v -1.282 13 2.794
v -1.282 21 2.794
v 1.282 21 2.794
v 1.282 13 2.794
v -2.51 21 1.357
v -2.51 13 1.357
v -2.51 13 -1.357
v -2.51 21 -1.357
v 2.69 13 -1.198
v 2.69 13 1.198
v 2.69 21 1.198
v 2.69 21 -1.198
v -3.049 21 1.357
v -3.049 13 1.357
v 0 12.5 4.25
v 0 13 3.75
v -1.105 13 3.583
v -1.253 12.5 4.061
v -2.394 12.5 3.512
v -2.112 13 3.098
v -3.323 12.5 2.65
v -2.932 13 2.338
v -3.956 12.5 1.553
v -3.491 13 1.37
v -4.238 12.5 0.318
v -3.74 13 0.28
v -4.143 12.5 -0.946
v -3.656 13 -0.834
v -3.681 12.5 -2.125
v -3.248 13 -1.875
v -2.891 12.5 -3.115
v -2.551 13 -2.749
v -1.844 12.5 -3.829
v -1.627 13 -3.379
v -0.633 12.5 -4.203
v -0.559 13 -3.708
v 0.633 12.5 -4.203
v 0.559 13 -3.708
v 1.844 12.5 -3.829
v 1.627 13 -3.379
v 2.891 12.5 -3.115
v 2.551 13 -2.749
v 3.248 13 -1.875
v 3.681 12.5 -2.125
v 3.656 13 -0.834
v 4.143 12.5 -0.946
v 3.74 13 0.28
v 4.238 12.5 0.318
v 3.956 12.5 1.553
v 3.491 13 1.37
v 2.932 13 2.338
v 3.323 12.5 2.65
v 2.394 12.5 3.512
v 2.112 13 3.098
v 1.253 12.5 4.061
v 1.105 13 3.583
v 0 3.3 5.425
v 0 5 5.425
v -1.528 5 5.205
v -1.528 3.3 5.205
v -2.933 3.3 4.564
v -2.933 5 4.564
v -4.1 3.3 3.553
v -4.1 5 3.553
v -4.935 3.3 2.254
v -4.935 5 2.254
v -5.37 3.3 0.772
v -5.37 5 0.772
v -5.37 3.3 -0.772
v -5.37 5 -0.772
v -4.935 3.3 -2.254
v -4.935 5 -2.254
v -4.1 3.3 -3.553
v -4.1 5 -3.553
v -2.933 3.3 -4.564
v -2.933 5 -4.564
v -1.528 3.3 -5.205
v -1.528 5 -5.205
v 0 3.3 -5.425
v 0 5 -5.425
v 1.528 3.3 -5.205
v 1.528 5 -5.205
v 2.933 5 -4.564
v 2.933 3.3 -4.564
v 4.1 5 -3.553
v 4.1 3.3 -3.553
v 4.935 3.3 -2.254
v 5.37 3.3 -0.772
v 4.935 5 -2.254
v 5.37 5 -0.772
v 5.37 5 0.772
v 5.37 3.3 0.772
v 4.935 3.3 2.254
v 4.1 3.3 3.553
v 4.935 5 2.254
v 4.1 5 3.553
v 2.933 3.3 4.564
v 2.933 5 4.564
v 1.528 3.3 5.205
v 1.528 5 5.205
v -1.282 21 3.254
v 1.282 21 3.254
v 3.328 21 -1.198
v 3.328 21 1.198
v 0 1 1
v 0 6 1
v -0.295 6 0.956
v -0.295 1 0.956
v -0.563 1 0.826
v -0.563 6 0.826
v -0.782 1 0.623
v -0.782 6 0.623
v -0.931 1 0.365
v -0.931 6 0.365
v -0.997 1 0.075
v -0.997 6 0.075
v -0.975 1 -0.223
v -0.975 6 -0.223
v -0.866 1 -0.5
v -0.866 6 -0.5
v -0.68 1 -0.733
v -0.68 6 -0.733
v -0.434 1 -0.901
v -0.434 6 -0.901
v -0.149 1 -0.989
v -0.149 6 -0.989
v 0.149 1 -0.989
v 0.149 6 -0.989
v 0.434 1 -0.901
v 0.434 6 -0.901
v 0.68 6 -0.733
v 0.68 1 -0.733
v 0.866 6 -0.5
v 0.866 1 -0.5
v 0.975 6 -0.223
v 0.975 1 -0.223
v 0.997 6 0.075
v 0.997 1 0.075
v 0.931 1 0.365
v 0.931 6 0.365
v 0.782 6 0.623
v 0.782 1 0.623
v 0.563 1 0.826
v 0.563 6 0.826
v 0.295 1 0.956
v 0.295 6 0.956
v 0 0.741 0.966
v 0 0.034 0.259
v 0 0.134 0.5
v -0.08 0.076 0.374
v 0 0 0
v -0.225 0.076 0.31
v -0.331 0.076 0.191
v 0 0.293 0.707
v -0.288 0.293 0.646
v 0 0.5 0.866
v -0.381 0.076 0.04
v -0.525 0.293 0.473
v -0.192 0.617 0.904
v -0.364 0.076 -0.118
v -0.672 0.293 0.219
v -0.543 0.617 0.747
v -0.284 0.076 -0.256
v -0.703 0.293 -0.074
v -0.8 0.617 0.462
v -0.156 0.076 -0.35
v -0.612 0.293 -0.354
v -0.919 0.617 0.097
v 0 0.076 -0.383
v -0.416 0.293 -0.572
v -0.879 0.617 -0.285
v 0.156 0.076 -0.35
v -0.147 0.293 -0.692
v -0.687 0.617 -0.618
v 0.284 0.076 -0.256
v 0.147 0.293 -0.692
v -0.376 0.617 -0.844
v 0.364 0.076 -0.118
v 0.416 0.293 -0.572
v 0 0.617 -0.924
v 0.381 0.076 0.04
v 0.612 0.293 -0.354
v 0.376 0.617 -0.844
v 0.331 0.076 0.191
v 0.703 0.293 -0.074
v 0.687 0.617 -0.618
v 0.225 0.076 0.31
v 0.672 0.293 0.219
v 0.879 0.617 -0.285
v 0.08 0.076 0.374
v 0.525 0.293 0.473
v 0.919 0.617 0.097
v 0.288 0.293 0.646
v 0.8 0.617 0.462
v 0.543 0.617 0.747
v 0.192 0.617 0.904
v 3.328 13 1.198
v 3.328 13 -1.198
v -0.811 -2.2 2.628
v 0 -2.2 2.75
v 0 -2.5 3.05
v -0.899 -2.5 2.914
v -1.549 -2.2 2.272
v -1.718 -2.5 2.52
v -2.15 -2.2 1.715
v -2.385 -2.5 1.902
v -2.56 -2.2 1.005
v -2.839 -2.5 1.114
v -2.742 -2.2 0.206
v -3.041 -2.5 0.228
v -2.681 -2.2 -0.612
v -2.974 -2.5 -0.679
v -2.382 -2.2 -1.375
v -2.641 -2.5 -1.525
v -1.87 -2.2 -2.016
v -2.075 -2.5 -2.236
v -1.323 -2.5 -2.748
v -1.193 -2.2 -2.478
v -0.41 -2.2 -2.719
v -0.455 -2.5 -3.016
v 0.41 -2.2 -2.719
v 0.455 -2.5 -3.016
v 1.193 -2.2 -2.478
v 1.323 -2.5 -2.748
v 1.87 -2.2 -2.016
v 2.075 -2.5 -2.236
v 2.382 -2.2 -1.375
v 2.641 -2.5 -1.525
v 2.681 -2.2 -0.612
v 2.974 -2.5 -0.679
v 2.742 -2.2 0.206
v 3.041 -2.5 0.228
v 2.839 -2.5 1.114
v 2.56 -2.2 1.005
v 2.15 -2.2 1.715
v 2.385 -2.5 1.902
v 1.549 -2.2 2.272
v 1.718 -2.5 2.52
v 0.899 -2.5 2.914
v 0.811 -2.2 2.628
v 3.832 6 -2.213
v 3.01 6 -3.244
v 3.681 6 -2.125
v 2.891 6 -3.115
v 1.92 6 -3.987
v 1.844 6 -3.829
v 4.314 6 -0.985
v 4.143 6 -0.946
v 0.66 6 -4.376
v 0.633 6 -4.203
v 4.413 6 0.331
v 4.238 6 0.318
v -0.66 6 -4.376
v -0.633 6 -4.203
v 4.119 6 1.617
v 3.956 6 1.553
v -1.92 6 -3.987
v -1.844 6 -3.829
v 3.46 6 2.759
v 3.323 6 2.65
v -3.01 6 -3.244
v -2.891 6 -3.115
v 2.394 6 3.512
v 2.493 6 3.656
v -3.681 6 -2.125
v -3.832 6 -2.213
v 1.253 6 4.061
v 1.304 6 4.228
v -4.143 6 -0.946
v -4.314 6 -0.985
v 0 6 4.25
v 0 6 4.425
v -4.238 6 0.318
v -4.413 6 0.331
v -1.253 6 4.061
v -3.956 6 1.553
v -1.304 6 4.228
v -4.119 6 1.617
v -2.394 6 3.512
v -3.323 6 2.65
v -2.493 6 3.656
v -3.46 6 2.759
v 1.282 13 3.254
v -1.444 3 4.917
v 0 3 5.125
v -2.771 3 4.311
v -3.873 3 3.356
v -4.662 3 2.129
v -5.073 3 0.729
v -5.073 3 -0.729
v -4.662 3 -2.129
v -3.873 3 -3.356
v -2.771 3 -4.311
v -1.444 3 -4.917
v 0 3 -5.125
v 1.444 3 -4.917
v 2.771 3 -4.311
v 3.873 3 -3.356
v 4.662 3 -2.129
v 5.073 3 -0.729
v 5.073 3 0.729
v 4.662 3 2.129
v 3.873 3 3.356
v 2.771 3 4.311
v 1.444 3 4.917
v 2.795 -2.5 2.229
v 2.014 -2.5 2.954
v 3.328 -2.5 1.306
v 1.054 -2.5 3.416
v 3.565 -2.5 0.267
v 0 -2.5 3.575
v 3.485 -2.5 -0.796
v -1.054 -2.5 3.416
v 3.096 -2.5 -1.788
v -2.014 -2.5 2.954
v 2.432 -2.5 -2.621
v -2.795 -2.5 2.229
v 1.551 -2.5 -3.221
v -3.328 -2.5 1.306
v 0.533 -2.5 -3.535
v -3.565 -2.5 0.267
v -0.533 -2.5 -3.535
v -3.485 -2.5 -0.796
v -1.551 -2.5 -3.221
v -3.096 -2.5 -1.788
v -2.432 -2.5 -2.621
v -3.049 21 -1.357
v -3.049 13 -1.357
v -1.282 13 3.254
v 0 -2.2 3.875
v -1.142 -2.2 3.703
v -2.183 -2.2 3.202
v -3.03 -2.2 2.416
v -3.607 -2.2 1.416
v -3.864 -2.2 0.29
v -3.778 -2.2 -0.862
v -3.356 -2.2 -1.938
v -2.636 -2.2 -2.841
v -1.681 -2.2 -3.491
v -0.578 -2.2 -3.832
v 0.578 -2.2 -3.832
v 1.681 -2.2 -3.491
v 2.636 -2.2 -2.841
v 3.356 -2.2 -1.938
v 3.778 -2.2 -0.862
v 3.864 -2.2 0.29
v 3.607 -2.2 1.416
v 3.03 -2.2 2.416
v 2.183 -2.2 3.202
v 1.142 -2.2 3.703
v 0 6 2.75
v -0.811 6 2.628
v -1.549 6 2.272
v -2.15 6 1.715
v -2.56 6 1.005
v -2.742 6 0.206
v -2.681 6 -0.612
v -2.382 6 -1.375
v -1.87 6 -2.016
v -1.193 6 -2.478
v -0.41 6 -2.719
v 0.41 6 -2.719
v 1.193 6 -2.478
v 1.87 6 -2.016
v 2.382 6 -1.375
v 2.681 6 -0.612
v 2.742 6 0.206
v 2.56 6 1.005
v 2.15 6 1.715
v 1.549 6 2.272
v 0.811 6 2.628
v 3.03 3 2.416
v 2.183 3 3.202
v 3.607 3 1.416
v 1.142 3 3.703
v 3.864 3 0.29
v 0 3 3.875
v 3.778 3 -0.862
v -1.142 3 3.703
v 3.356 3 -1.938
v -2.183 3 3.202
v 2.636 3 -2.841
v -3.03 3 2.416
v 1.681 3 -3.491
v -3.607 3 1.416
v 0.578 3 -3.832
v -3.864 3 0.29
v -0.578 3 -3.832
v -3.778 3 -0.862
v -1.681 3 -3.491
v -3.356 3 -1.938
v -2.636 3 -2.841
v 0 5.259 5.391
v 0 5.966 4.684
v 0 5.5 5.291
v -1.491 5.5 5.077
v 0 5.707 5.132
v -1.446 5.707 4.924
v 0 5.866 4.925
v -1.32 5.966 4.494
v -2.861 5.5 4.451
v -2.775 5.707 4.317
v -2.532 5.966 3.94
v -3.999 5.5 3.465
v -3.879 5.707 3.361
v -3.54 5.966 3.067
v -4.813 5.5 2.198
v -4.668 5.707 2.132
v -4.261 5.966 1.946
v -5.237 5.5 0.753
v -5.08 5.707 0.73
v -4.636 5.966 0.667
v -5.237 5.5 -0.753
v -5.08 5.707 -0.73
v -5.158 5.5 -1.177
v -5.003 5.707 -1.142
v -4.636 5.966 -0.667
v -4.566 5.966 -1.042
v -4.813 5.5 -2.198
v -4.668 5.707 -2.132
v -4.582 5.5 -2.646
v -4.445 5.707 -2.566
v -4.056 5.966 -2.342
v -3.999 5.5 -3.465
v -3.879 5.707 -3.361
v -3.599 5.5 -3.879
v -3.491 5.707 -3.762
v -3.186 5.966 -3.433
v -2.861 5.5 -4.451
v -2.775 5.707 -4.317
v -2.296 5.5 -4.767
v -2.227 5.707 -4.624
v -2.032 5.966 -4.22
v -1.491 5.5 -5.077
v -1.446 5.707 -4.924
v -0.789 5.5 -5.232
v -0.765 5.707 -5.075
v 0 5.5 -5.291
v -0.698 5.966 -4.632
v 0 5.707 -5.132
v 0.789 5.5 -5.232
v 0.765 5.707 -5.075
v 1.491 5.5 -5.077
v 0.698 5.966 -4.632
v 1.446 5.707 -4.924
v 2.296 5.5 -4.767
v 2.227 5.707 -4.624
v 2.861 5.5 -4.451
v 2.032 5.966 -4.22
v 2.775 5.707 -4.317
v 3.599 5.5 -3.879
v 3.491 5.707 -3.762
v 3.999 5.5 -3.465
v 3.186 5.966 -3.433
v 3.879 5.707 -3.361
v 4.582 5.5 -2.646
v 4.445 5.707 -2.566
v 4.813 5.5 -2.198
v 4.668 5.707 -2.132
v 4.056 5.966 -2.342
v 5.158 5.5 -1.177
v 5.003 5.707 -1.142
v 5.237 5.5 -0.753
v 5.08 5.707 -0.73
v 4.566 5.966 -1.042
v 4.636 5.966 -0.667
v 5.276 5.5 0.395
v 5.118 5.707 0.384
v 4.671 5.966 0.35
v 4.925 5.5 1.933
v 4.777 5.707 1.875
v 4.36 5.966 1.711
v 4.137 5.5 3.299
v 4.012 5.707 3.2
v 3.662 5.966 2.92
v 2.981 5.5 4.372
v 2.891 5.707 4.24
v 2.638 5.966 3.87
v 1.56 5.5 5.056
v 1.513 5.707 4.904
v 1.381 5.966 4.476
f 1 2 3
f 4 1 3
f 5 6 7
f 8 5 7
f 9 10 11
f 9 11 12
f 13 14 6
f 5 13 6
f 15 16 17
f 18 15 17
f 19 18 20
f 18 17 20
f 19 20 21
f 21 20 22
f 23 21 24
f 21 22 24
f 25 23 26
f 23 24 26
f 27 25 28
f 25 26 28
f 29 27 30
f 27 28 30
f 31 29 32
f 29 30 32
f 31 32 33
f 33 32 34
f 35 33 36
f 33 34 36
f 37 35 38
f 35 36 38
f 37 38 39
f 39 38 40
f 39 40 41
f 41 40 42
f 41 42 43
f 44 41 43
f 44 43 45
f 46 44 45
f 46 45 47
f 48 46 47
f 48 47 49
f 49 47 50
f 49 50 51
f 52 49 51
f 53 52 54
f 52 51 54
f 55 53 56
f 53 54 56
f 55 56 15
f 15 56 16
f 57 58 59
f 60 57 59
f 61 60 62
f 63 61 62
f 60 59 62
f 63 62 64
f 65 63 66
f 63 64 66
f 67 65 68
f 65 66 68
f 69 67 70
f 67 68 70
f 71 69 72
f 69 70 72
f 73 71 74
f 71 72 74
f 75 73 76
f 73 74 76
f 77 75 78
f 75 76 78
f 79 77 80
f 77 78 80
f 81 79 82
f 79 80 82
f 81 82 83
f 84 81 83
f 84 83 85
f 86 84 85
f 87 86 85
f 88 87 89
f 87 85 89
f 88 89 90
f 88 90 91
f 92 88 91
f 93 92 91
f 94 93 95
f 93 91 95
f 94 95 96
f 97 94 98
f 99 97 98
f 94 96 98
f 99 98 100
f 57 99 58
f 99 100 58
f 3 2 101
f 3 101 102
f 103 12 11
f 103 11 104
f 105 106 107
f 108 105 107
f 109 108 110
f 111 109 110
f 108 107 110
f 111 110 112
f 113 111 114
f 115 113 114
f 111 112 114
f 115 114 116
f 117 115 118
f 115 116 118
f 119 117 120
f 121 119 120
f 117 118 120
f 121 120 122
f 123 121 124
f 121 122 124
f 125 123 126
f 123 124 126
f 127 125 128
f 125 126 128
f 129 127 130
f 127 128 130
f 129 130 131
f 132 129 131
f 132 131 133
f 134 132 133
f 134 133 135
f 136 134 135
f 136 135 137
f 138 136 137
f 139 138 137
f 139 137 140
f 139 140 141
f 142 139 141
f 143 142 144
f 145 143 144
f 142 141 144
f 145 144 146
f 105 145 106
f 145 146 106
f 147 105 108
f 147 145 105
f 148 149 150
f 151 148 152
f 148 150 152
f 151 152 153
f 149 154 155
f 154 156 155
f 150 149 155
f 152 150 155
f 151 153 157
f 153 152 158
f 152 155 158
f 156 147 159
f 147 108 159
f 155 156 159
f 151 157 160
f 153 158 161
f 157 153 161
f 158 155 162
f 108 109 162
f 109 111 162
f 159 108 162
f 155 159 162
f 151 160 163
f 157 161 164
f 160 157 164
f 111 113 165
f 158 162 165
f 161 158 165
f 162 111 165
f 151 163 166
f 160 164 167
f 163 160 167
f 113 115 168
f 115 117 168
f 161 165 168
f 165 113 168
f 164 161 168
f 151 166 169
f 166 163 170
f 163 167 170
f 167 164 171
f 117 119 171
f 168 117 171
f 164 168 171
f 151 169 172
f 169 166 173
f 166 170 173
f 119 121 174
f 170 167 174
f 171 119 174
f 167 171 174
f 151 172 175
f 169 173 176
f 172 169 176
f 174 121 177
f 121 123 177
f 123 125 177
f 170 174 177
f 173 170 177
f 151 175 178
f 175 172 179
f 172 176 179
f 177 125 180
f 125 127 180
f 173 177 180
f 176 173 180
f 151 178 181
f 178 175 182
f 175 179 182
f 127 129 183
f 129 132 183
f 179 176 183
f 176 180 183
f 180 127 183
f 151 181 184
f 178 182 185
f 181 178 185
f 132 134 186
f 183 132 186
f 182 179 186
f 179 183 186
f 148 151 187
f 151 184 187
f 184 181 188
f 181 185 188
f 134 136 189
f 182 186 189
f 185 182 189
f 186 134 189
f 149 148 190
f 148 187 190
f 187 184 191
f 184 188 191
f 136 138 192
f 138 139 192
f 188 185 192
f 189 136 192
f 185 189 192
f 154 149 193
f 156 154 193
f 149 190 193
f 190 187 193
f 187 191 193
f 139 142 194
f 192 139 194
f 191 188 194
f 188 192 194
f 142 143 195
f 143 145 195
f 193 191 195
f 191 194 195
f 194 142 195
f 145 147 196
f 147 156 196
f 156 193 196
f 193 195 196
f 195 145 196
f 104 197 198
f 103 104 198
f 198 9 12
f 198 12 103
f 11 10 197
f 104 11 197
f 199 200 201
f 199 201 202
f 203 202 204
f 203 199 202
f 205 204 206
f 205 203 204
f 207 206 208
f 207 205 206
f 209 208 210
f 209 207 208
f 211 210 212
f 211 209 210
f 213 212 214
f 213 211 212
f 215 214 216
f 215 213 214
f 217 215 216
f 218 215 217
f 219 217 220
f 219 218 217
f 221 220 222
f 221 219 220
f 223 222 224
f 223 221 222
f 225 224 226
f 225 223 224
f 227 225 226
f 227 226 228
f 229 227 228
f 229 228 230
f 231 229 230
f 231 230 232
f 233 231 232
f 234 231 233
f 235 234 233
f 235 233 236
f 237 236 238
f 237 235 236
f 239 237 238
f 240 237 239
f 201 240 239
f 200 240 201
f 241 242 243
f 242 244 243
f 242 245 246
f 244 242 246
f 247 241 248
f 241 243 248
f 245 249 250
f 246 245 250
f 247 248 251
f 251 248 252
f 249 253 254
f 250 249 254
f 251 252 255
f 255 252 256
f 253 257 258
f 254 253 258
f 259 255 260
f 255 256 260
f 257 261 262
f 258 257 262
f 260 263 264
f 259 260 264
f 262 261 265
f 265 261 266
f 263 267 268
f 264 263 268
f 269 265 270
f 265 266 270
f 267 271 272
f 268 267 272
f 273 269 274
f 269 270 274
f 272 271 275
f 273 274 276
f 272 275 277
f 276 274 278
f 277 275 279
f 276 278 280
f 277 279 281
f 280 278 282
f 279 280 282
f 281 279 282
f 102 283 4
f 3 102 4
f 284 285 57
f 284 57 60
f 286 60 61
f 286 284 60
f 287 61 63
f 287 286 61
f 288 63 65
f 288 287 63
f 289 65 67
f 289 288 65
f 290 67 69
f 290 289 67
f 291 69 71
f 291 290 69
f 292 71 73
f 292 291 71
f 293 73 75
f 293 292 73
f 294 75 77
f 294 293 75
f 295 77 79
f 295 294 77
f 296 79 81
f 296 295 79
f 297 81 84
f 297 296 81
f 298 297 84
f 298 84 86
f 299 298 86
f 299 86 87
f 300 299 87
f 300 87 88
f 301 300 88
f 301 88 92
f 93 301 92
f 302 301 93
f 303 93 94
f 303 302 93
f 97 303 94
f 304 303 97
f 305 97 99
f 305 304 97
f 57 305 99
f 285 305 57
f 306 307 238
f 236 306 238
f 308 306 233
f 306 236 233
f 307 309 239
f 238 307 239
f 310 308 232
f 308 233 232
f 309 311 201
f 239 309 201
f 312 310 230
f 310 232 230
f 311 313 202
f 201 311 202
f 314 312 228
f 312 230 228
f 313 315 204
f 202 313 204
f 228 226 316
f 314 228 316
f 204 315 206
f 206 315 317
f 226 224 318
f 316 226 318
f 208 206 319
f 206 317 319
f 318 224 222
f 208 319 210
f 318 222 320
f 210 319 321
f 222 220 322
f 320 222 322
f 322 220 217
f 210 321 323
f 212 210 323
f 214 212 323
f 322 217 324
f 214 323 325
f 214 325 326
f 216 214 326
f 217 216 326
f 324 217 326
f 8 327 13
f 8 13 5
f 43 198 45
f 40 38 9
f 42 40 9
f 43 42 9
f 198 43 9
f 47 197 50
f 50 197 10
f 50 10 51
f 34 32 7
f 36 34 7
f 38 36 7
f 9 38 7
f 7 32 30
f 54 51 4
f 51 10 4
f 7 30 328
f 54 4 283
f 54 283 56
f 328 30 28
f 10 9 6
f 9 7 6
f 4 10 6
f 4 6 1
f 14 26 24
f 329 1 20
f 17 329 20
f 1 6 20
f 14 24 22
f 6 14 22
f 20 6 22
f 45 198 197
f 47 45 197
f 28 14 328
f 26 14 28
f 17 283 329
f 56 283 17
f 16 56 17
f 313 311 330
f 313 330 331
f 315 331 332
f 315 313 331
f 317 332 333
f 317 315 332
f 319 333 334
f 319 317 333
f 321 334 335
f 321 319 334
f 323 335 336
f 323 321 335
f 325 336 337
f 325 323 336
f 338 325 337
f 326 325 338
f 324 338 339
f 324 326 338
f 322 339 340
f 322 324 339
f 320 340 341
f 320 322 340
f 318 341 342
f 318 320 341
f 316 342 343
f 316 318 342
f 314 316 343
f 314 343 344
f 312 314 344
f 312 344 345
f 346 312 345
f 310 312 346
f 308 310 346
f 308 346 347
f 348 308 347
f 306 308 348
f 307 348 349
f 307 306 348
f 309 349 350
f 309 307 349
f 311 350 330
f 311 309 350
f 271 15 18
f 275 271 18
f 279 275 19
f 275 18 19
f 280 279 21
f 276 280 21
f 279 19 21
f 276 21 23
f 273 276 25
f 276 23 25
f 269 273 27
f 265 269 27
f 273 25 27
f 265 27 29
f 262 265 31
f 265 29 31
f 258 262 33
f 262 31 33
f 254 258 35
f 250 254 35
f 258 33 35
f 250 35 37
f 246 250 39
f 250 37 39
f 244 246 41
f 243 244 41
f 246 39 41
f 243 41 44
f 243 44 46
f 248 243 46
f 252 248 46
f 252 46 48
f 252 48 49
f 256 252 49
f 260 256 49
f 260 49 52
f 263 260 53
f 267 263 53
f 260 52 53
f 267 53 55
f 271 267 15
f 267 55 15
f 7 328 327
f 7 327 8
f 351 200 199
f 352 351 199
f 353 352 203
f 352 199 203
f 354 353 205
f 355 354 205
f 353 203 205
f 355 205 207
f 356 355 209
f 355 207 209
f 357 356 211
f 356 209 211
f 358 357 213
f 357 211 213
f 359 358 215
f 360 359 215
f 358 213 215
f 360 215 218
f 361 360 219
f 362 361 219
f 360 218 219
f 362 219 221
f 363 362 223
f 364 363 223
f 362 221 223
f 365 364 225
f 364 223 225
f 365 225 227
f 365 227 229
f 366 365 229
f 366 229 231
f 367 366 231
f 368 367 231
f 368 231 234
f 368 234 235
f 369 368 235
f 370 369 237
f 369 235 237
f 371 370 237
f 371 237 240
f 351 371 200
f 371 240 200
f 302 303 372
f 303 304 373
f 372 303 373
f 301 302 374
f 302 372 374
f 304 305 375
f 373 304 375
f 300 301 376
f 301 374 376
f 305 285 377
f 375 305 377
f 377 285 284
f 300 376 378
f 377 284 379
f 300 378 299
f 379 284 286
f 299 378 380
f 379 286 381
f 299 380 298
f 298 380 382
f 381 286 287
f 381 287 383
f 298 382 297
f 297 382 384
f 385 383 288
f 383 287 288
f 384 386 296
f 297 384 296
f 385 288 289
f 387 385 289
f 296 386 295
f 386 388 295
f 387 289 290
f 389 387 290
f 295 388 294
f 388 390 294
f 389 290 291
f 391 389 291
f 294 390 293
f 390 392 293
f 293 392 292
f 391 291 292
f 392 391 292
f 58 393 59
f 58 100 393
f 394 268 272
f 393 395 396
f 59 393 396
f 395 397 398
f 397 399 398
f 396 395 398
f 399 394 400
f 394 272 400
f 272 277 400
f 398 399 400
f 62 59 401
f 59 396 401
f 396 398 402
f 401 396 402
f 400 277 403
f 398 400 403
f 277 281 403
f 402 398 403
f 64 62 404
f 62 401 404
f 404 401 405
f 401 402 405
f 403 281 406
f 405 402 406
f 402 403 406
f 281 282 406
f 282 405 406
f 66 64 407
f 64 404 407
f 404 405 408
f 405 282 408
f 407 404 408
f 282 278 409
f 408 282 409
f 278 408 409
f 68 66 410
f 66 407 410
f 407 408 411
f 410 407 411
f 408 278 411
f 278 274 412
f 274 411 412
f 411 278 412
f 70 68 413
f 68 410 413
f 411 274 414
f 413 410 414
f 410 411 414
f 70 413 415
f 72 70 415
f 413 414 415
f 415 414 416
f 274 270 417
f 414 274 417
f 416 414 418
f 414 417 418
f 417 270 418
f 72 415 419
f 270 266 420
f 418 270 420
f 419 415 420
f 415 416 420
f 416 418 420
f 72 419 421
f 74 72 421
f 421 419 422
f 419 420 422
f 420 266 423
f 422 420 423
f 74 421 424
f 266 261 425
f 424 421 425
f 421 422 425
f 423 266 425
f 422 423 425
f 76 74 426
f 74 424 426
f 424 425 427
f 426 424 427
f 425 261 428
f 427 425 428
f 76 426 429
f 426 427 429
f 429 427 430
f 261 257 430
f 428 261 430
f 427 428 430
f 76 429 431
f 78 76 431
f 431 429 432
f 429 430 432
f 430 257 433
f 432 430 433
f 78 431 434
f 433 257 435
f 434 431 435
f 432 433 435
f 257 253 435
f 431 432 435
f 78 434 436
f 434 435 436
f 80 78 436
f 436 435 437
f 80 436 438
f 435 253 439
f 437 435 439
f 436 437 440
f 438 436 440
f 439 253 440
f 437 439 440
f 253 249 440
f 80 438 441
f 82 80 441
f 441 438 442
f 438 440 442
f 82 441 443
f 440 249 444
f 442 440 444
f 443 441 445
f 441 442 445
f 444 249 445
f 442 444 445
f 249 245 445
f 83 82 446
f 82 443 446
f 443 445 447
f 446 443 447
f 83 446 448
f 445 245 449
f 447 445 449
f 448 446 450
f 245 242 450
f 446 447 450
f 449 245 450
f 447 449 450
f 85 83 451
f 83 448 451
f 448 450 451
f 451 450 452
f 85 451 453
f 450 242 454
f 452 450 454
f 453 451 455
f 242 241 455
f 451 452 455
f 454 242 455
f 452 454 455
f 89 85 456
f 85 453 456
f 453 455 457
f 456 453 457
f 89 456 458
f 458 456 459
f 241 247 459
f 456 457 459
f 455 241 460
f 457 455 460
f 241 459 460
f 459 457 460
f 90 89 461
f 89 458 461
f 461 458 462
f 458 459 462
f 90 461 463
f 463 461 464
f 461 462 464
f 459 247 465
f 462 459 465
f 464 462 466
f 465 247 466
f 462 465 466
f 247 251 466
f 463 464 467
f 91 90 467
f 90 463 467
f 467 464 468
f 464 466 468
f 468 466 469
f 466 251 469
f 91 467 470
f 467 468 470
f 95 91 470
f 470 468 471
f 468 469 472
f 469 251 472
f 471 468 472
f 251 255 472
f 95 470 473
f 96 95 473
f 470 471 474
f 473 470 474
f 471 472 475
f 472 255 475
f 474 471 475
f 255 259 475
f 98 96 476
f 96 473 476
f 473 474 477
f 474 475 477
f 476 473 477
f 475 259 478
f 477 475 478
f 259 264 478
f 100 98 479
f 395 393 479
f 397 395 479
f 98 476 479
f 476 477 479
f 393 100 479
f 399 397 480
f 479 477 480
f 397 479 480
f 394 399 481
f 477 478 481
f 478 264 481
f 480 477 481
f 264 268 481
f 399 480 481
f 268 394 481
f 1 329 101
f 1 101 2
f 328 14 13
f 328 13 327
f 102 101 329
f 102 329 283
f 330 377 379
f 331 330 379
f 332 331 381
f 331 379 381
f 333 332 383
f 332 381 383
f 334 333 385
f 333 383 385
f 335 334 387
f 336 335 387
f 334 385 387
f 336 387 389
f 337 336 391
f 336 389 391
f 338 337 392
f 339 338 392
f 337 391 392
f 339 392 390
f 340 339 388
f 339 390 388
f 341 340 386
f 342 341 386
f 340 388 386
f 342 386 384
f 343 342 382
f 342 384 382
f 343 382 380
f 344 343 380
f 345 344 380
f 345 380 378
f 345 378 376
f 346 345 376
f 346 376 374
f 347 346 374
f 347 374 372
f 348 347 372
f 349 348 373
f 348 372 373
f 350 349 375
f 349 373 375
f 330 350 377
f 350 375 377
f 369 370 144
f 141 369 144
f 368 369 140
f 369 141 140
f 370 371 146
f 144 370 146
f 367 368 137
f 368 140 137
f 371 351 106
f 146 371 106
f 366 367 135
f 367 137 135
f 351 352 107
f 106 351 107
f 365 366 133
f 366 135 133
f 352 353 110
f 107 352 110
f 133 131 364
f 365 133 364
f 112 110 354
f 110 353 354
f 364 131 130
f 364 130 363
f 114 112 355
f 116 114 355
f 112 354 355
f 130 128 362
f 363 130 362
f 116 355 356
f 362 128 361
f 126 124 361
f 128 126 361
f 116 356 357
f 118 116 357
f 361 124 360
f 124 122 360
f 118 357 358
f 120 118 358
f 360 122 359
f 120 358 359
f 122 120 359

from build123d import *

# Parameters (mm, degrees)
REDONDEO1_R             = 1
REDONDEO2_R             = 1
CHAFL_N1_SIZE           = 0.3
CHAFL_N2_SIZE           = 0.5
CROQUIS2_W              = 2.564908208
CROQUIS2_H              = 0.459088629
CROQUIS2_W_2            = 0.638732005
CROQUIS2_H_2            = 2.39524502
CROQUIS2_W_3            = 0.538930129
CROQUIS2_H_3            = 2.714611022
SALIENTE_EXTRUIR1_DEPTH = 8


with BuildPart() as part:
    # Croquis1 → Revolución1 (revolve)
    with BuildSketch(Plane.XY, mode=Mode.PRIVATE) as revoluci_n1_sk:
        Polygon((0, 0), (1, 0), (1, 6), (2.75, 6), (2.75, -2.5), (3.875, -2.5), (3.875, 3), (5.425, 3), (5.425, 6), (4.25, 6), (4.25, 13), (0, 13), align=None)
    revolve(revoluci_n1_sk.sketch.rotate(Axis((0, 0, 0), (0, -1, 0)), 90), axis=Axis((0, 0, 0), (0, -1, 0)))

    # Redondeo1
    redondeo1_edges = [part.edges().sort_by_distance(p)[0] for p in [
        (0, 0, -1),
    ]]
    fillet(redondeo1_edges, radius=REDONDEO1_R)

    # Redondeo2
    redondeo2_edges = [part.edges().sort_by_distance(p)[0] for p in [
        (0, 6, -5.425),
    ]]
    fillet(redondeo2_edges, radius=REDONDEO2_R)

    # Chaflán1
    chafl_n1_edges = [part.edges().sort_by_distance(p)[0] for p in [
        (0, 3, -5.425),
        (0, -2.5, -3.875),
        (0, -2.5, -2.75),
    ]]
    chamfer(chafl_n1_edges, length=CHAFL_N1_SIZE)

    # Chaflán2
    chafl_n2_edges = [part.edges().sort_by_distance(p)[0] for p in [
        (0, 13, -4.25),
    ]]
    chamfer(chafl_n2_edges, length=CHAFL_N2_SIZE)

    # Croquis2 → Saliente-Extruir1 (add)
    with BuildSketch(Plane(origin=(0, 13, 0), x_dir=(1, 0, 0), z_dir=(0, 1, 0))):
        with Locations((0, -3.023996838)):
            Rectangle(CROQUIS2_W, CROQUIS2_H)
        with Locations((3.009026556, 0)):
            Rectangle(CROQUIS2_W_2, CROQUIS2_H_2)
        with Locations((-2.779482242, 0)):
            Rectangle(CROQUIS2_W_3, CROQUIS2_H_3)
    extrude(amount=SALIENTE_EXTRUIR1_DEPTH)


solid = part.part
